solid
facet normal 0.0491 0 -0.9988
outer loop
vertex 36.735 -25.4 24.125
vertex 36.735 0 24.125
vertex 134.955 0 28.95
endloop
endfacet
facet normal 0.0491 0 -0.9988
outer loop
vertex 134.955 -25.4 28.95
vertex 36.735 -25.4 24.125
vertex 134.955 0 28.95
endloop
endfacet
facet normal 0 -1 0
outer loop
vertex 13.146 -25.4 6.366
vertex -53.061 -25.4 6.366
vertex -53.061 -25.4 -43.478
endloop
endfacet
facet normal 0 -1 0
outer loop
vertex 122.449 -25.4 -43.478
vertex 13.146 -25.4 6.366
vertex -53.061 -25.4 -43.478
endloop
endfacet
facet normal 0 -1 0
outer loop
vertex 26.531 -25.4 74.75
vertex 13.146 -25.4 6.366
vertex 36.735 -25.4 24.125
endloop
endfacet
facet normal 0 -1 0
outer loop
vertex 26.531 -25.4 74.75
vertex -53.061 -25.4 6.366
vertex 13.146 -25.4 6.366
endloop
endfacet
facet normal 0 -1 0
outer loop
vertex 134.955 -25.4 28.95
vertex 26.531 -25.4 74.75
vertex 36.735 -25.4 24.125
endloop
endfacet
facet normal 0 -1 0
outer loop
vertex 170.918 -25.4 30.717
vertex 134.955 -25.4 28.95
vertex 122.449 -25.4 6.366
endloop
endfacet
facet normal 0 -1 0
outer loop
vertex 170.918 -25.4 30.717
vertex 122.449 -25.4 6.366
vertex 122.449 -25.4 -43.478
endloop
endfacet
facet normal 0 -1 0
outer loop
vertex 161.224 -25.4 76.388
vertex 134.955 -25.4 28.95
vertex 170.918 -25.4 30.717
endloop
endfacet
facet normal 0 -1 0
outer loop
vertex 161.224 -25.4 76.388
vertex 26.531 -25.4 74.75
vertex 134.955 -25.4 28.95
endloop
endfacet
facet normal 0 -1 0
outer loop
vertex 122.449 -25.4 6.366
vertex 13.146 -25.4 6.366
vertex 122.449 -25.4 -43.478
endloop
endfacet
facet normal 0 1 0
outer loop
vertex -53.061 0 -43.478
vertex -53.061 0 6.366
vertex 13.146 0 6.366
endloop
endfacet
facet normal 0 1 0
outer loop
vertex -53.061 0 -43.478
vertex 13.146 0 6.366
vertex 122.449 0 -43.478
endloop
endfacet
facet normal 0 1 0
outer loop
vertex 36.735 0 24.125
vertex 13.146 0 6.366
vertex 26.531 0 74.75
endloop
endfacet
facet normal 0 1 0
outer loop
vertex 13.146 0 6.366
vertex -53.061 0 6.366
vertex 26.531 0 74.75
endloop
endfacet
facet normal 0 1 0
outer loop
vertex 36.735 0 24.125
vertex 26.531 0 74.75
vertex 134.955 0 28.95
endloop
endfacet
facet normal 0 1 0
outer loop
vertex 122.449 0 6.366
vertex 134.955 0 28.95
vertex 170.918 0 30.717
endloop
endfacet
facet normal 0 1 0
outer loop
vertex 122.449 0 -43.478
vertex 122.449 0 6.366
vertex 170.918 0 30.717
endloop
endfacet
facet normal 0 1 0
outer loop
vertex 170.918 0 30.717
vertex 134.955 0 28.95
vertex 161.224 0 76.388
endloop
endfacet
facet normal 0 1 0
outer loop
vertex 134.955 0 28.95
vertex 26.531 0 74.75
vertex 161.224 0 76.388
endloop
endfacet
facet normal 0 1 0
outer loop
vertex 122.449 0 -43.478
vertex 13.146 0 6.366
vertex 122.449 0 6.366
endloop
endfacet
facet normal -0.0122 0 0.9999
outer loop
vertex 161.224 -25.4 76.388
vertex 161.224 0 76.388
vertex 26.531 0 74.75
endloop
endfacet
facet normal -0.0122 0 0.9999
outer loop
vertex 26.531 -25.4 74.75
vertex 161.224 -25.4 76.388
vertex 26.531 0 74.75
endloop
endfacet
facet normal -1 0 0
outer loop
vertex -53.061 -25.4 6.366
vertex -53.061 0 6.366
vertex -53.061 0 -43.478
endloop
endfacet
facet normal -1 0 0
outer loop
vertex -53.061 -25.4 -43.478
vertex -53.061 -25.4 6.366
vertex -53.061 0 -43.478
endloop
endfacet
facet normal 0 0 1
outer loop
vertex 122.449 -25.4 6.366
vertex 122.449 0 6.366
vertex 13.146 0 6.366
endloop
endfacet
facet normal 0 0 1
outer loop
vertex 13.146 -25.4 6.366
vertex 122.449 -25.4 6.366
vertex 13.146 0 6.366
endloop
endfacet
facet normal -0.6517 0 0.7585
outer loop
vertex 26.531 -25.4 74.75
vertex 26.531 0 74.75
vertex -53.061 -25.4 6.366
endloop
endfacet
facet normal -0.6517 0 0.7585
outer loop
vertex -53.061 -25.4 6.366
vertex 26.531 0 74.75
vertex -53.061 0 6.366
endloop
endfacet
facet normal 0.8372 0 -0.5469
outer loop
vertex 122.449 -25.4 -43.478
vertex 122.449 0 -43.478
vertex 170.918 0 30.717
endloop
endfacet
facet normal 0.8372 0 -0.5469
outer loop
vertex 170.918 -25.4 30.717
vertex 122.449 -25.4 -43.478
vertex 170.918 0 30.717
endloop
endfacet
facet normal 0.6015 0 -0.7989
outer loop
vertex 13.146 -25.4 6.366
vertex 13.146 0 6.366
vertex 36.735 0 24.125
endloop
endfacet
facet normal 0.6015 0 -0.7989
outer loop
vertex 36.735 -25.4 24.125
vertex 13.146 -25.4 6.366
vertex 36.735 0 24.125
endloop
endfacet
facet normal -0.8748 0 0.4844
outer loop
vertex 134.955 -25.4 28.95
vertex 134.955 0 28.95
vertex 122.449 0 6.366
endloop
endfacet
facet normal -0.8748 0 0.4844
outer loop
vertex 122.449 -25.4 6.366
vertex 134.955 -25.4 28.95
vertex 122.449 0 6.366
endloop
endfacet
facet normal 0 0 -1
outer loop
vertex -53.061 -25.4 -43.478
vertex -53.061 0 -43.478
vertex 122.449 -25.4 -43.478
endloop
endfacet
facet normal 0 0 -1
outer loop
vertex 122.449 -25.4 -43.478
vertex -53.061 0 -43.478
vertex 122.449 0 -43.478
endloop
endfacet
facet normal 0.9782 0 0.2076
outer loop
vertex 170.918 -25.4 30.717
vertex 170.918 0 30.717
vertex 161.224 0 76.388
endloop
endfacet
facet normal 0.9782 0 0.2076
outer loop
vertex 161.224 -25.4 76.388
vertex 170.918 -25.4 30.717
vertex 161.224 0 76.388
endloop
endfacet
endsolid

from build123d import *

# Parameters (mm, degrees)
F1_DEPTH = 25.4


with BuildPart() as f1:
    # F0 (on Front) → F1 (new body)
    with BuildSketch(Plane.XZ):
        Polygon((26.530553, 74.750386), (-53.061098, 6.366197), (13.146355, 6.366197), (36.734607, 24.124743), align=None)
        Polygon((13.146355, 6.366197), (-53.061098, 6.366197), (-53.061098, -43.478452), align=None)
        Polygon((122.448683, 6.366197), (13.146355, 6.366197), (-53.061098, -43.478452), (122.448683, -43.478452), align=None)
        Polygon((161.224097, 76.388255), (26.530553, 74.750386), (36.734607, 24.124743), (134.954938, 28.95045), align=None)
        Polygon((134.954938, 28.95045), (122.448683, 6.366197), (122.448683, -43.478452), (170.917973, 30.717365), align=None)
        Polygon((170.917973, 30.717365), (161.224097, 76.388255), (134.954938, 28.95045), align=None)
    extrude(amount=F1_DEPTH)


solid = f1.part
